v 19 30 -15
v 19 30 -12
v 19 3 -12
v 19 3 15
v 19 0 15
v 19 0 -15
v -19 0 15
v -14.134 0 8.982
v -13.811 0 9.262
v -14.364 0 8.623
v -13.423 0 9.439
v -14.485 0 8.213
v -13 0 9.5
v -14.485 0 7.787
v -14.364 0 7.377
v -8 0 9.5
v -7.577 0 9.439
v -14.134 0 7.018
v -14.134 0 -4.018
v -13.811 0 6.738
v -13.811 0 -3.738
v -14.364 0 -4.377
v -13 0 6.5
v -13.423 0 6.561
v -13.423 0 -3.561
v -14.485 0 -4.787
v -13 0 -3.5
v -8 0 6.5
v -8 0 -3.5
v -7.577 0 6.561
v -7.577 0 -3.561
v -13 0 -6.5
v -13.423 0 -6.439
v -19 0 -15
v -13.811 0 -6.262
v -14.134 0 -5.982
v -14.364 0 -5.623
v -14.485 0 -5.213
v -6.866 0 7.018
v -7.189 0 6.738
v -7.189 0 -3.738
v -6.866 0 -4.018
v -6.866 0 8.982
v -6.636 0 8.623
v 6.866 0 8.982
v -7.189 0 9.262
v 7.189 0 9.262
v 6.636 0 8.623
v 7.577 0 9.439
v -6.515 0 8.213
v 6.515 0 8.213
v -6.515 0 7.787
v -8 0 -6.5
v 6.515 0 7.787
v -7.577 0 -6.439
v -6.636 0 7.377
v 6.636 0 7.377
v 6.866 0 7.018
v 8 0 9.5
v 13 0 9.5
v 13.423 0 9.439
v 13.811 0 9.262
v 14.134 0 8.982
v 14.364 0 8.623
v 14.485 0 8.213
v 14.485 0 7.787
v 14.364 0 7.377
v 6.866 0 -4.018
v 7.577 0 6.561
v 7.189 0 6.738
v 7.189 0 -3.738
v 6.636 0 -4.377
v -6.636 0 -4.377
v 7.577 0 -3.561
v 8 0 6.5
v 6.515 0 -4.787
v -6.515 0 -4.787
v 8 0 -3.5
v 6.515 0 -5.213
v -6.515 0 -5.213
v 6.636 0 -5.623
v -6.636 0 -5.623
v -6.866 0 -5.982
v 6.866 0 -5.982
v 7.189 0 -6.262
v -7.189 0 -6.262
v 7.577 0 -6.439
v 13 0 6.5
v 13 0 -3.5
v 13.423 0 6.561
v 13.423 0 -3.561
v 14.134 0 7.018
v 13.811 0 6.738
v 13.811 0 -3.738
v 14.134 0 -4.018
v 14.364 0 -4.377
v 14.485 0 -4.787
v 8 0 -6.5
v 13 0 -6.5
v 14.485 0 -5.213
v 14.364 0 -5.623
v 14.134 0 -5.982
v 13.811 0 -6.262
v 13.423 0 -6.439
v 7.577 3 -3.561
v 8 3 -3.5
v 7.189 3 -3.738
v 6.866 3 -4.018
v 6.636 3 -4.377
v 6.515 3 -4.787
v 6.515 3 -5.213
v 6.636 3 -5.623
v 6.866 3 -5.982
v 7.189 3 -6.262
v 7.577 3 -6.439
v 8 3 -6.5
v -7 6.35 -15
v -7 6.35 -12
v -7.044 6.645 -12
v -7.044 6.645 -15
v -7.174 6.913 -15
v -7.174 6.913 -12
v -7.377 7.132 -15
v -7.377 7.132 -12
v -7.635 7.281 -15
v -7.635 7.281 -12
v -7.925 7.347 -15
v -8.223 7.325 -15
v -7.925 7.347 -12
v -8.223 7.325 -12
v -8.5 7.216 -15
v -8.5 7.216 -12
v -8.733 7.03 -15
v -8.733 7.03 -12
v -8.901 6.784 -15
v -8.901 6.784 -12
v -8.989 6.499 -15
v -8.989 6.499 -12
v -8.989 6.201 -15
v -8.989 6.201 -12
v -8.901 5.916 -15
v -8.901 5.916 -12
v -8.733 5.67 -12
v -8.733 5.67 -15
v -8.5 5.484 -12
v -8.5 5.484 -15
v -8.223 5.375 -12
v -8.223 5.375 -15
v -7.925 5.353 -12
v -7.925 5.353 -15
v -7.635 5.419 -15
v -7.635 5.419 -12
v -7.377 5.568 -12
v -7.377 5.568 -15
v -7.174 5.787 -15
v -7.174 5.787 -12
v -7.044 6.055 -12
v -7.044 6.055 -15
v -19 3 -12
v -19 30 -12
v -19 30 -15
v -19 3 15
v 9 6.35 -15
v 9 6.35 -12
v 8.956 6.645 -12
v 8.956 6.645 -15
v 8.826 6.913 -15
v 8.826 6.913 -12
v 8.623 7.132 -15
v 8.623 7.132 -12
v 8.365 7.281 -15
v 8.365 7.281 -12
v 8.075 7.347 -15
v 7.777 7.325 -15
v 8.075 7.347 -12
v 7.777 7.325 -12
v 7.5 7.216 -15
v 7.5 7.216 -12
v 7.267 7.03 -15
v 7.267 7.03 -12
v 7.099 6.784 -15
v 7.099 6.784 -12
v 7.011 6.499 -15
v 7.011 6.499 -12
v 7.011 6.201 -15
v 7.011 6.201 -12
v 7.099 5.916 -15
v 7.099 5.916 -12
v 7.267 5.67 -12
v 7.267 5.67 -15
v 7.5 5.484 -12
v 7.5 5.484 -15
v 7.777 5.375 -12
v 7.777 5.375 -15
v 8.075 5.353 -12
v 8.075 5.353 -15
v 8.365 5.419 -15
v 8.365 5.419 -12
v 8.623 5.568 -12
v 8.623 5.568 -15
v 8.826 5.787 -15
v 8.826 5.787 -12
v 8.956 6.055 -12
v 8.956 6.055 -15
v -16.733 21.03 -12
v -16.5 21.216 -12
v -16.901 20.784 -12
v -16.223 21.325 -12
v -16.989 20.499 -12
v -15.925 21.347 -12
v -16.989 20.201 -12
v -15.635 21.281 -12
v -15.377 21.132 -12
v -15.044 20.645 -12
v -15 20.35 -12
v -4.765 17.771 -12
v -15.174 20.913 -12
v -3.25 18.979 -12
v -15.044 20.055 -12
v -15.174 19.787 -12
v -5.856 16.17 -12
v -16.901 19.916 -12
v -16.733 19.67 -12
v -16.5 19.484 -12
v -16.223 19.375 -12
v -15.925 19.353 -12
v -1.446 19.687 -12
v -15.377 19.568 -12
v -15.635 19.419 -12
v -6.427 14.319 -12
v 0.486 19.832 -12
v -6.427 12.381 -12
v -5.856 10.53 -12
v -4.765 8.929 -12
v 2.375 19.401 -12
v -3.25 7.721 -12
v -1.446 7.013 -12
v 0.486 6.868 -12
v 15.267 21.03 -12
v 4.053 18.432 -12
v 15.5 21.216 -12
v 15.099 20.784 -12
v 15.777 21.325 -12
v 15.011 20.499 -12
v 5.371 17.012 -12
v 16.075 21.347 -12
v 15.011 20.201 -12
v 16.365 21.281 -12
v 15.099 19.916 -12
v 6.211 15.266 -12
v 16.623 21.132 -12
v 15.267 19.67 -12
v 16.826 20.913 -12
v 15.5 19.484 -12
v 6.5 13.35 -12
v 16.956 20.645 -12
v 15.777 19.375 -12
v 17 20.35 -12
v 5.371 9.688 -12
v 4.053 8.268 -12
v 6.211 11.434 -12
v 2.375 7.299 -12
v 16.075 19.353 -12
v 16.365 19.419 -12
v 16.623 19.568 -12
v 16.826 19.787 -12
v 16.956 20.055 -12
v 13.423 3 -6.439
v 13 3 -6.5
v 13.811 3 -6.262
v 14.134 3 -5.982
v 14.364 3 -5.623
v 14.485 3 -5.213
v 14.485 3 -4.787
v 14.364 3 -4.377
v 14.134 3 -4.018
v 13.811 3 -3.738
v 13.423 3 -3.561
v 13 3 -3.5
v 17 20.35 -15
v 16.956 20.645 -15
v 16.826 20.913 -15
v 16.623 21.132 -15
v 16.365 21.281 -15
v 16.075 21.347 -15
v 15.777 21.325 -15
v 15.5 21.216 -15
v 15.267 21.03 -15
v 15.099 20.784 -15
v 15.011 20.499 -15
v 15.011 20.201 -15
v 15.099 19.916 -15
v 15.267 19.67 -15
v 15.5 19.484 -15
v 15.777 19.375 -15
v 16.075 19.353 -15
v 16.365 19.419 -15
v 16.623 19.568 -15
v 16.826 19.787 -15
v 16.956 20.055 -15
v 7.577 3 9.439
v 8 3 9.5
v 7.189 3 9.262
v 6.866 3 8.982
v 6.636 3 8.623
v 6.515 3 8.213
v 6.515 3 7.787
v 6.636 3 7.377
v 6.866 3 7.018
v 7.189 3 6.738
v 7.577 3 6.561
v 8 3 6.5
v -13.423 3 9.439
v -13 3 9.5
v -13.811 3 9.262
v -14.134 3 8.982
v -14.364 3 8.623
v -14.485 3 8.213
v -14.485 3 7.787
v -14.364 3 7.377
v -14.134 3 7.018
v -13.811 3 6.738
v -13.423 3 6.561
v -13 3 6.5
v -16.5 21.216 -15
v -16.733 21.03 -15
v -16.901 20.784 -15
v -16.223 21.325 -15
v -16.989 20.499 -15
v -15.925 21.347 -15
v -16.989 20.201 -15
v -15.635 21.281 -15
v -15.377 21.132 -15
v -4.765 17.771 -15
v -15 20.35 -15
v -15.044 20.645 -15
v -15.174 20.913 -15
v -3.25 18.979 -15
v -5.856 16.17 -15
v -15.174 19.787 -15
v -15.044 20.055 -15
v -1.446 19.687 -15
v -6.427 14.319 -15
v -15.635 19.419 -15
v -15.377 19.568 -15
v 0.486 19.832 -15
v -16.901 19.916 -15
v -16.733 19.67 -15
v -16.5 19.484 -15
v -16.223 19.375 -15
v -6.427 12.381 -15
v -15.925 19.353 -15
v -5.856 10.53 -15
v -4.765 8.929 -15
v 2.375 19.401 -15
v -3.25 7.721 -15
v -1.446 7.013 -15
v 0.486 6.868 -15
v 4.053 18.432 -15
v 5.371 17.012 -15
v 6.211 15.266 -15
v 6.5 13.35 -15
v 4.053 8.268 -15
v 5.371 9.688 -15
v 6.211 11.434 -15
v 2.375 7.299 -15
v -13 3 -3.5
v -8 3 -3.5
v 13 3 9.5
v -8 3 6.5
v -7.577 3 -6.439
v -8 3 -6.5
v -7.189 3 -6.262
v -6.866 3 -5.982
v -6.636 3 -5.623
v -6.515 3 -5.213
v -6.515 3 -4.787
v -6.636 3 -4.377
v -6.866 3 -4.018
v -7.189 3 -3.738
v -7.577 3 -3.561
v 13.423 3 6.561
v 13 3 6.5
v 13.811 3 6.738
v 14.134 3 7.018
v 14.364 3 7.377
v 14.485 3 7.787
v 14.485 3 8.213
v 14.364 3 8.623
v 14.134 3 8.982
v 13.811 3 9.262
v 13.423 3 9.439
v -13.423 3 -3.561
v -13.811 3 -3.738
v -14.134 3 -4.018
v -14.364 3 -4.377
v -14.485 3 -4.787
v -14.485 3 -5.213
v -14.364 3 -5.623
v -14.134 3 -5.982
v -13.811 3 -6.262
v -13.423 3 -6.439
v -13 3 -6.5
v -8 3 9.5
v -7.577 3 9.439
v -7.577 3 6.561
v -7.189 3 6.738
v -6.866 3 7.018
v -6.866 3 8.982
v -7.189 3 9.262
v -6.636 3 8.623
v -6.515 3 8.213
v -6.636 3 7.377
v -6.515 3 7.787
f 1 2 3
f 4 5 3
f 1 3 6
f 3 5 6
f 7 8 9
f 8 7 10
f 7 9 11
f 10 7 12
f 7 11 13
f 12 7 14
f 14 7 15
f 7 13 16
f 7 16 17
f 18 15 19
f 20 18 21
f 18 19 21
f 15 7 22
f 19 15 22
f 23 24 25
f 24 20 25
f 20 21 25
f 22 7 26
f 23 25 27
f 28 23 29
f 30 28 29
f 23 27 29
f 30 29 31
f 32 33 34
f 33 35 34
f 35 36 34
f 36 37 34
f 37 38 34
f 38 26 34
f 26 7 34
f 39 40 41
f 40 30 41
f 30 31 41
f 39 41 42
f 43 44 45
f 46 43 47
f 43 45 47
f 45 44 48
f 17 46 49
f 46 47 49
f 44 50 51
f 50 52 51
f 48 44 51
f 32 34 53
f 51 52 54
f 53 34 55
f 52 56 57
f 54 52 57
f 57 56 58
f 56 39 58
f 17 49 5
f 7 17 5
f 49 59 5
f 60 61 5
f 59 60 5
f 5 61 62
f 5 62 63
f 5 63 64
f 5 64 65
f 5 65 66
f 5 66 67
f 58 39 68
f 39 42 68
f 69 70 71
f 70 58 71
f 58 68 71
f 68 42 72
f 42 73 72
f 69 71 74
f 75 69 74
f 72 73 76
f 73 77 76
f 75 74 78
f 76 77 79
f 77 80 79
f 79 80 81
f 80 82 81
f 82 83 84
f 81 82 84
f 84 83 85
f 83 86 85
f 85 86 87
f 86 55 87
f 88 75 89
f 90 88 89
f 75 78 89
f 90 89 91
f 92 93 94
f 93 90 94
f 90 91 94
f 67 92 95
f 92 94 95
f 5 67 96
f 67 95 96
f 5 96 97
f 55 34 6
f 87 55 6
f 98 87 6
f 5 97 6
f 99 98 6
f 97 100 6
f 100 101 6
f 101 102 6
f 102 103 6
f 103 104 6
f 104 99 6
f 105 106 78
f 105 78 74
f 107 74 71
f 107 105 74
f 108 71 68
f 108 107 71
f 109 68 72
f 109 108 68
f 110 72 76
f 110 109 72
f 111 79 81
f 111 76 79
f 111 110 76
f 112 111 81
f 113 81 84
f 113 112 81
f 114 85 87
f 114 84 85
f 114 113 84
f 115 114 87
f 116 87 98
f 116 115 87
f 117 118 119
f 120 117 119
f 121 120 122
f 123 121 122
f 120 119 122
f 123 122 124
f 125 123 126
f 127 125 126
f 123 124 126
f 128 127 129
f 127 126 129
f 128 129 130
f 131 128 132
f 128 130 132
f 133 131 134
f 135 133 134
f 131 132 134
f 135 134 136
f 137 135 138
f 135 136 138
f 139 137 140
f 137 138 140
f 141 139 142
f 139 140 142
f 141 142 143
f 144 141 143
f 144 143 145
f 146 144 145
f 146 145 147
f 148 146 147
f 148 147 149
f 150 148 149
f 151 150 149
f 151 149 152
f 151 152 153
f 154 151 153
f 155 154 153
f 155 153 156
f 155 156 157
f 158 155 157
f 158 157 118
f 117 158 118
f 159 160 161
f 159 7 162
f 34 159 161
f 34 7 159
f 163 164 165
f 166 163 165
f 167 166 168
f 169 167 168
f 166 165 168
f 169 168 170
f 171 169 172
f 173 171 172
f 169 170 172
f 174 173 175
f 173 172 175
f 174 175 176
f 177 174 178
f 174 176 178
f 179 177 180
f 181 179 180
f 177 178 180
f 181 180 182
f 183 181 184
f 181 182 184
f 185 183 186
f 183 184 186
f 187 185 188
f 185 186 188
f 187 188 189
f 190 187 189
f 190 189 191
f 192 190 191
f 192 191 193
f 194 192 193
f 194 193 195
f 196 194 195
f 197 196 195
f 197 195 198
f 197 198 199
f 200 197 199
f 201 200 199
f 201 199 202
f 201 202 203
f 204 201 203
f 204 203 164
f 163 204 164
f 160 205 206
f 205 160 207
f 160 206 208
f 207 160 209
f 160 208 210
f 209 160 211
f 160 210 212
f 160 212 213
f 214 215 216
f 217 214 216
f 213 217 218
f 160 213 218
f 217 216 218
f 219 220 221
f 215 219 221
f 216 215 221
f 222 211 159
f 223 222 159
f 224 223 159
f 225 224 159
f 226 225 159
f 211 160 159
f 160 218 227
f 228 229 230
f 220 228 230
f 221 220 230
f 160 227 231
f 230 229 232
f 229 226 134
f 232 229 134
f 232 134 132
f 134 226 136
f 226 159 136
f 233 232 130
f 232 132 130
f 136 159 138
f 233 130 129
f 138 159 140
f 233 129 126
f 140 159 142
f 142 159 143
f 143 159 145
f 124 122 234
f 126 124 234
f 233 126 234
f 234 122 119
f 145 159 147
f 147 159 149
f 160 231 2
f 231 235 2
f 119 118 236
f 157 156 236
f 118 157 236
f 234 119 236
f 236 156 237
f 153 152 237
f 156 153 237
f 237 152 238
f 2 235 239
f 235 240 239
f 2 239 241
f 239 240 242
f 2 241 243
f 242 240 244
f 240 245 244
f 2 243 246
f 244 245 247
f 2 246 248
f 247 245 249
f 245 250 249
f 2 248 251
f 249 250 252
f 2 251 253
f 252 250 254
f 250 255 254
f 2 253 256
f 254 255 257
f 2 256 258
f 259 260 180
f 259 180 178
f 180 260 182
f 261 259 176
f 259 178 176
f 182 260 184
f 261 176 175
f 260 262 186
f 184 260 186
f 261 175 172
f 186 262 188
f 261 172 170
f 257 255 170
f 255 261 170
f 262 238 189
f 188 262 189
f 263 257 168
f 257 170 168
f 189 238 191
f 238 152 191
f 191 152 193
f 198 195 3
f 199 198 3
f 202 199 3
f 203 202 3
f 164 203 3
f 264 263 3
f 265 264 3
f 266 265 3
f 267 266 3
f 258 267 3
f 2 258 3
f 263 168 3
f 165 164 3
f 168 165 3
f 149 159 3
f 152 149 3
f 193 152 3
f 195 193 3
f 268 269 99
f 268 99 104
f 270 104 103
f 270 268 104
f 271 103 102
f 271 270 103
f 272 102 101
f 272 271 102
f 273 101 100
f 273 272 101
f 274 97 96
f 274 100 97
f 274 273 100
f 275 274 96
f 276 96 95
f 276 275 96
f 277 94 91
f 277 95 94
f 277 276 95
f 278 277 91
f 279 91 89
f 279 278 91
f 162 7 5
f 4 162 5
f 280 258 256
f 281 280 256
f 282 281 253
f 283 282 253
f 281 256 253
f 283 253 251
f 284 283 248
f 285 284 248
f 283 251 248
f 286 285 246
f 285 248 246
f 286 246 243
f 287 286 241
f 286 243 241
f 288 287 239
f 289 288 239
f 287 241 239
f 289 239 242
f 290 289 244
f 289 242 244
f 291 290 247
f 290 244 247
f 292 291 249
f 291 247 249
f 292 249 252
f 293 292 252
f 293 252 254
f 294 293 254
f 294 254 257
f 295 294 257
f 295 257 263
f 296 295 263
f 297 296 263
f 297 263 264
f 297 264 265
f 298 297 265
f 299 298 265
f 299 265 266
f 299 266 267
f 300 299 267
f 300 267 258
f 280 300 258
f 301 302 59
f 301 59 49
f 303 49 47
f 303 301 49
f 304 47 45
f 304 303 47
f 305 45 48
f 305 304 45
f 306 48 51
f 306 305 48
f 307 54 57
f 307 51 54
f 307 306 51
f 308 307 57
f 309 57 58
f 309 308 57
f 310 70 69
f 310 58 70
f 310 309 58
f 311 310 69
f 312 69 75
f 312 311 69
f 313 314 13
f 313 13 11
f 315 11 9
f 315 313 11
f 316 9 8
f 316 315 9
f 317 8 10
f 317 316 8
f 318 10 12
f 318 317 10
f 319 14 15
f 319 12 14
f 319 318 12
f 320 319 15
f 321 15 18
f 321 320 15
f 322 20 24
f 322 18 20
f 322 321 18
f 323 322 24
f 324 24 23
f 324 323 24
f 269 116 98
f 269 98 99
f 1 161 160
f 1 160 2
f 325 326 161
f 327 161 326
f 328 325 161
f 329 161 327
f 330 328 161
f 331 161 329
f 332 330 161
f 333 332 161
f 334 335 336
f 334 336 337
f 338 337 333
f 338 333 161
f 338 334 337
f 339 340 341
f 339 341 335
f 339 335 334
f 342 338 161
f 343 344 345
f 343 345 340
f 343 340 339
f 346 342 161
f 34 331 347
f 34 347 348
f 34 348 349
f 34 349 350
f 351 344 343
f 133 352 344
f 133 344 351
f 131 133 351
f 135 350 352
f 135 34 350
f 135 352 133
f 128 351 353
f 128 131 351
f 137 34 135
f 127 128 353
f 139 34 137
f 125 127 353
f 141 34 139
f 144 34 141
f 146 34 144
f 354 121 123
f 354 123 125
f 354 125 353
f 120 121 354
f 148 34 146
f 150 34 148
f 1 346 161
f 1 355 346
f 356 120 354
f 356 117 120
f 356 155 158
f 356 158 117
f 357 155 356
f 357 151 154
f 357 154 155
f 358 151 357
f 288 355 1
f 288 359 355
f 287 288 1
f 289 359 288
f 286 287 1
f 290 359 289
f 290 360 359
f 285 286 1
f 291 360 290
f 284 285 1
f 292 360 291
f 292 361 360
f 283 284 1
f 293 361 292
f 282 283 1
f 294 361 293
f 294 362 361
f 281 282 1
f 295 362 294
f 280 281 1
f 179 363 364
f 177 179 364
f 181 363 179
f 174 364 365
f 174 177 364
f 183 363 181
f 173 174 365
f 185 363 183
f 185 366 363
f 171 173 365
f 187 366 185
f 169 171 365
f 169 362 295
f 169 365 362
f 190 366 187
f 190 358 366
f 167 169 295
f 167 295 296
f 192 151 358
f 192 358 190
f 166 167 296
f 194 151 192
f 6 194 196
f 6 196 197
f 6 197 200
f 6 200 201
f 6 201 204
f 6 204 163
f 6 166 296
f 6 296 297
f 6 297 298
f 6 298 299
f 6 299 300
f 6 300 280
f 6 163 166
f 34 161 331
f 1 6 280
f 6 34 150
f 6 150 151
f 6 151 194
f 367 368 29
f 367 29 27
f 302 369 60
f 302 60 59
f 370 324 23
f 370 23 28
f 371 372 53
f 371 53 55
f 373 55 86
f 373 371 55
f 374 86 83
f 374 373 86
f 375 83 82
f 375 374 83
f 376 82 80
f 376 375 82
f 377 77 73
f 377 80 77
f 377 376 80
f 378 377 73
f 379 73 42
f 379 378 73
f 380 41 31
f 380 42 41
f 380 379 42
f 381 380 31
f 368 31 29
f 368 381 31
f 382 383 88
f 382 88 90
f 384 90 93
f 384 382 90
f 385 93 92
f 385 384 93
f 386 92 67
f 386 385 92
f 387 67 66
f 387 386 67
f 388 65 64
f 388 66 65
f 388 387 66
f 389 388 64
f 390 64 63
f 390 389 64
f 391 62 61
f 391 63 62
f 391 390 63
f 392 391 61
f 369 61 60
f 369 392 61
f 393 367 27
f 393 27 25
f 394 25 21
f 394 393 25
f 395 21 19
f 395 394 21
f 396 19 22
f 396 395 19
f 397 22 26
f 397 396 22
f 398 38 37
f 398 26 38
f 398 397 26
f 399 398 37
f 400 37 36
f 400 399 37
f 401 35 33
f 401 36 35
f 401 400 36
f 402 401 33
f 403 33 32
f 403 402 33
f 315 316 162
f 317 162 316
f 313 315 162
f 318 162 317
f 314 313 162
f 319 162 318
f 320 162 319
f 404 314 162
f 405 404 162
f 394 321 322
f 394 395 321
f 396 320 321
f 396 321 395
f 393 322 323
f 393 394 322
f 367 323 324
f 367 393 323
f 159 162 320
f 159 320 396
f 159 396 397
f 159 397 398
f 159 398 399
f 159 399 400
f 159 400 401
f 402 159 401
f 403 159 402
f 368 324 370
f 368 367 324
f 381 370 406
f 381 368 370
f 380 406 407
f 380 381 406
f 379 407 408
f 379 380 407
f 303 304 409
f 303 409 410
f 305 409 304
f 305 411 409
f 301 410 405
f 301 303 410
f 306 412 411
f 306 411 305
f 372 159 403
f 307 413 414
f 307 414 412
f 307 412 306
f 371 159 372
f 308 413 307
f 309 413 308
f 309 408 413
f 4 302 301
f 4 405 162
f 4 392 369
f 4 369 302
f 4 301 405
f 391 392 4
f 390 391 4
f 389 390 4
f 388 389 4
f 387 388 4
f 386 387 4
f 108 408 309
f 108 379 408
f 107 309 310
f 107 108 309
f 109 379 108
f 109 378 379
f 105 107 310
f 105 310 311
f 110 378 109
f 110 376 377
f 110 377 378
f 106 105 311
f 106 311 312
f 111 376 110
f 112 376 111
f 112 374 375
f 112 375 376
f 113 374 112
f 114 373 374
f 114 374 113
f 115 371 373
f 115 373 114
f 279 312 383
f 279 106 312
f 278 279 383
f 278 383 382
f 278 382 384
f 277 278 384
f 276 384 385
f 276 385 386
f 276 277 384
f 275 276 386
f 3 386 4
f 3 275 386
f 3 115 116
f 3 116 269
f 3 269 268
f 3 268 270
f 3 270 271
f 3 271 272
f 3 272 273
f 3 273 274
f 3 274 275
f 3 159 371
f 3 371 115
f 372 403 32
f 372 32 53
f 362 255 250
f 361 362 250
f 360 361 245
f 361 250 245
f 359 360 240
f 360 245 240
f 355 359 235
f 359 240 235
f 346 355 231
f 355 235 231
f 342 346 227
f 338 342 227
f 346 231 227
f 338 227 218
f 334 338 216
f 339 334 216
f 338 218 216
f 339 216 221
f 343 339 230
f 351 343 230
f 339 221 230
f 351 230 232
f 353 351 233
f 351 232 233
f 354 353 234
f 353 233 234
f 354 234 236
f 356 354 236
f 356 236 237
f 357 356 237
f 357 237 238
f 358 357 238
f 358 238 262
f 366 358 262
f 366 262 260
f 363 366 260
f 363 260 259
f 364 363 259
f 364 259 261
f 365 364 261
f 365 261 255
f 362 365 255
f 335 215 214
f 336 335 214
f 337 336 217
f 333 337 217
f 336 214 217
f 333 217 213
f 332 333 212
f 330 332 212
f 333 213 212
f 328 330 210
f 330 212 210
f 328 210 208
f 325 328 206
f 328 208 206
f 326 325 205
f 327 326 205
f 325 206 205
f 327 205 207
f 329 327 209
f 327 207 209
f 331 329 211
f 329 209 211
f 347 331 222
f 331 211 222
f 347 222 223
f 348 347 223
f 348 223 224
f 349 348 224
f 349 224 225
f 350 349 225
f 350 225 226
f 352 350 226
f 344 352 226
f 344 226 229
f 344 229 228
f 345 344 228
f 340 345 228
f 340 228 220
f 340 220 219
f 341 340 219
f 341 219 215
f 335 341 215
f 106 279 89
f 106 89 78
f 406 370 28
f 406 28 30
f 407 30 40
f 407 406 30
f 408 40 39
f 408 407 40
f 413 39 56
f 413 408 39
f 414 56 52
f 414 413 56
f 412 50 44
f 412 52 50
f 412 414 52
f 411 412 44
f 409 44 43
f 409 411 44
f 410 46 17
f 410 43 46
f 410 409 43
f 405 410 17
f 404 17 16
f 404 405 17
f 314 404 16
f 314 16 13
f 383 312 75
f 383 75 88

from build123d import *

# Parameters (mm, degrees)
SKETCH2_W           = 38
SKETCH2_H           = 30
BOSS_EXTRUDE1_DEPTH = 3
SKETCH3_W           = 38
SKETCH3_H           = 3
BOSS_EXTRUDE2_DEPTH = 27
SKETCH4_R           = 6.5
CUT_EXTRUDE1_DEPTH  = 27
CUT_EXTRUDE2_DEPTH  = 37.262928729
SKETCH6_R           = 1
CUT_EXTRUDE3_DEPTH  = 45.609416046


with BuildPart() as part:
    # Sketch2 → Boss-Extrude1 (new body)
    with BuildSketch(Plane(origin=(0, 0, 0), x_dir=(1, 0, 0), z_dir=(0, 1, 0))):
        Rectangle(SKETCH2_W, SKETCH2_H)
    extrude(amount=BOSS_EXTRUDE1_DEPTH)

    # Sketch3 → Boss-Extrude2 (add)
    with BuildSketch(Plane(origin=(0, 3, 0), x_dir=(1, 0, 0), z_dir=(0, 1, 0))):
        with Locations((0, 13.5)):
            Rectangle(SKETCH3_W, SKETCH3_H)
    extrude(amount=BOSS_EXTRUDE2_DEPTH)

    # Sketch4 → Cut-Extrude1 (cut)
    with BuildSketch(Plane.XY.offset(-12)):
        with Locations((0, 13.35)):
            Circle(SKETCH4_R)
    extrude(amount=-CUT_EXTRUDE1_DEPTH, mode=Mode.SUBTRACT)

    # Sketch5 → Cut-Extrude2 (cut, through all)
    with BuildSketch(Plane(origin=(0, 3, 0), x_dir=(1, 0, 0), z_dir=(0, 1, 0))):
        with BuildLine():
            Line((-13, 6.5), (-8, 6.5))
            ThreePointArc((-8, 6.5), (-6.5, 5), (-8, 3.5))
            Line((-8, 3.5), (-13, 3.5))
            ThreePointArc((-13, 3.5), (-14.5, 5), (-13, 6.5))
        make_face()
        with BuildLine():
            Line((8, 6.5), (13, 6.5))
            ThreePointArc((13, 6.5), (14.5, 5), (13, 3.5))
            Line((13, 3.5), (8, 3.5))
            ThreePointArc((8, 3.5), (6.5, 5), (8, 6.5))
        make_face()
        with BuildLine():
            Line((8, -6.5), (13, -6.5))
            ThreePointArc((13, -6.5), (14.5, -8), (13, -9.5))
            Line((13, -9.5), (8, -9.5))
            ThreePointArc((8, -9.5), (6.5, -8), (8, -6.5))
        make_face()
        with BuildLine():
            Line((-13, -6.5), (-8, -6.5))
            ThreePointArc((-8, -6.5), (-6.5, -8), (-8, -9.5))
            Line((-8, -9.5), (-13, -9.5))
            ThreePointArc((-13, -9.5), (-14.5, -8), (-13, -6.5))
        make_face()
    extrude(amount=-CUT_EXTRUDE2_DEPTH, mode=Mode.SUBTRACT)

    # Sketch6 → Cut-Extrude3 (cut, through all)
    with BuildSketch(Plane.XY.offset(-12)):
        with Locations((16, 20.35)):
            Circle(SKETCH6_R)
        with Locations((-16, 20.35)):
            Circle(SKETCH6_R)
        with Locations((-8, 6.35)):
            Circle(SKETCH6_R)
        with Locations((8, 6.35)):
            Circle(SKETCH6_R)
    extrude(amount=-CUT_EXTRUDE3_DEPTH, mode=Mode.SUBTRACT)


solid = part.part
